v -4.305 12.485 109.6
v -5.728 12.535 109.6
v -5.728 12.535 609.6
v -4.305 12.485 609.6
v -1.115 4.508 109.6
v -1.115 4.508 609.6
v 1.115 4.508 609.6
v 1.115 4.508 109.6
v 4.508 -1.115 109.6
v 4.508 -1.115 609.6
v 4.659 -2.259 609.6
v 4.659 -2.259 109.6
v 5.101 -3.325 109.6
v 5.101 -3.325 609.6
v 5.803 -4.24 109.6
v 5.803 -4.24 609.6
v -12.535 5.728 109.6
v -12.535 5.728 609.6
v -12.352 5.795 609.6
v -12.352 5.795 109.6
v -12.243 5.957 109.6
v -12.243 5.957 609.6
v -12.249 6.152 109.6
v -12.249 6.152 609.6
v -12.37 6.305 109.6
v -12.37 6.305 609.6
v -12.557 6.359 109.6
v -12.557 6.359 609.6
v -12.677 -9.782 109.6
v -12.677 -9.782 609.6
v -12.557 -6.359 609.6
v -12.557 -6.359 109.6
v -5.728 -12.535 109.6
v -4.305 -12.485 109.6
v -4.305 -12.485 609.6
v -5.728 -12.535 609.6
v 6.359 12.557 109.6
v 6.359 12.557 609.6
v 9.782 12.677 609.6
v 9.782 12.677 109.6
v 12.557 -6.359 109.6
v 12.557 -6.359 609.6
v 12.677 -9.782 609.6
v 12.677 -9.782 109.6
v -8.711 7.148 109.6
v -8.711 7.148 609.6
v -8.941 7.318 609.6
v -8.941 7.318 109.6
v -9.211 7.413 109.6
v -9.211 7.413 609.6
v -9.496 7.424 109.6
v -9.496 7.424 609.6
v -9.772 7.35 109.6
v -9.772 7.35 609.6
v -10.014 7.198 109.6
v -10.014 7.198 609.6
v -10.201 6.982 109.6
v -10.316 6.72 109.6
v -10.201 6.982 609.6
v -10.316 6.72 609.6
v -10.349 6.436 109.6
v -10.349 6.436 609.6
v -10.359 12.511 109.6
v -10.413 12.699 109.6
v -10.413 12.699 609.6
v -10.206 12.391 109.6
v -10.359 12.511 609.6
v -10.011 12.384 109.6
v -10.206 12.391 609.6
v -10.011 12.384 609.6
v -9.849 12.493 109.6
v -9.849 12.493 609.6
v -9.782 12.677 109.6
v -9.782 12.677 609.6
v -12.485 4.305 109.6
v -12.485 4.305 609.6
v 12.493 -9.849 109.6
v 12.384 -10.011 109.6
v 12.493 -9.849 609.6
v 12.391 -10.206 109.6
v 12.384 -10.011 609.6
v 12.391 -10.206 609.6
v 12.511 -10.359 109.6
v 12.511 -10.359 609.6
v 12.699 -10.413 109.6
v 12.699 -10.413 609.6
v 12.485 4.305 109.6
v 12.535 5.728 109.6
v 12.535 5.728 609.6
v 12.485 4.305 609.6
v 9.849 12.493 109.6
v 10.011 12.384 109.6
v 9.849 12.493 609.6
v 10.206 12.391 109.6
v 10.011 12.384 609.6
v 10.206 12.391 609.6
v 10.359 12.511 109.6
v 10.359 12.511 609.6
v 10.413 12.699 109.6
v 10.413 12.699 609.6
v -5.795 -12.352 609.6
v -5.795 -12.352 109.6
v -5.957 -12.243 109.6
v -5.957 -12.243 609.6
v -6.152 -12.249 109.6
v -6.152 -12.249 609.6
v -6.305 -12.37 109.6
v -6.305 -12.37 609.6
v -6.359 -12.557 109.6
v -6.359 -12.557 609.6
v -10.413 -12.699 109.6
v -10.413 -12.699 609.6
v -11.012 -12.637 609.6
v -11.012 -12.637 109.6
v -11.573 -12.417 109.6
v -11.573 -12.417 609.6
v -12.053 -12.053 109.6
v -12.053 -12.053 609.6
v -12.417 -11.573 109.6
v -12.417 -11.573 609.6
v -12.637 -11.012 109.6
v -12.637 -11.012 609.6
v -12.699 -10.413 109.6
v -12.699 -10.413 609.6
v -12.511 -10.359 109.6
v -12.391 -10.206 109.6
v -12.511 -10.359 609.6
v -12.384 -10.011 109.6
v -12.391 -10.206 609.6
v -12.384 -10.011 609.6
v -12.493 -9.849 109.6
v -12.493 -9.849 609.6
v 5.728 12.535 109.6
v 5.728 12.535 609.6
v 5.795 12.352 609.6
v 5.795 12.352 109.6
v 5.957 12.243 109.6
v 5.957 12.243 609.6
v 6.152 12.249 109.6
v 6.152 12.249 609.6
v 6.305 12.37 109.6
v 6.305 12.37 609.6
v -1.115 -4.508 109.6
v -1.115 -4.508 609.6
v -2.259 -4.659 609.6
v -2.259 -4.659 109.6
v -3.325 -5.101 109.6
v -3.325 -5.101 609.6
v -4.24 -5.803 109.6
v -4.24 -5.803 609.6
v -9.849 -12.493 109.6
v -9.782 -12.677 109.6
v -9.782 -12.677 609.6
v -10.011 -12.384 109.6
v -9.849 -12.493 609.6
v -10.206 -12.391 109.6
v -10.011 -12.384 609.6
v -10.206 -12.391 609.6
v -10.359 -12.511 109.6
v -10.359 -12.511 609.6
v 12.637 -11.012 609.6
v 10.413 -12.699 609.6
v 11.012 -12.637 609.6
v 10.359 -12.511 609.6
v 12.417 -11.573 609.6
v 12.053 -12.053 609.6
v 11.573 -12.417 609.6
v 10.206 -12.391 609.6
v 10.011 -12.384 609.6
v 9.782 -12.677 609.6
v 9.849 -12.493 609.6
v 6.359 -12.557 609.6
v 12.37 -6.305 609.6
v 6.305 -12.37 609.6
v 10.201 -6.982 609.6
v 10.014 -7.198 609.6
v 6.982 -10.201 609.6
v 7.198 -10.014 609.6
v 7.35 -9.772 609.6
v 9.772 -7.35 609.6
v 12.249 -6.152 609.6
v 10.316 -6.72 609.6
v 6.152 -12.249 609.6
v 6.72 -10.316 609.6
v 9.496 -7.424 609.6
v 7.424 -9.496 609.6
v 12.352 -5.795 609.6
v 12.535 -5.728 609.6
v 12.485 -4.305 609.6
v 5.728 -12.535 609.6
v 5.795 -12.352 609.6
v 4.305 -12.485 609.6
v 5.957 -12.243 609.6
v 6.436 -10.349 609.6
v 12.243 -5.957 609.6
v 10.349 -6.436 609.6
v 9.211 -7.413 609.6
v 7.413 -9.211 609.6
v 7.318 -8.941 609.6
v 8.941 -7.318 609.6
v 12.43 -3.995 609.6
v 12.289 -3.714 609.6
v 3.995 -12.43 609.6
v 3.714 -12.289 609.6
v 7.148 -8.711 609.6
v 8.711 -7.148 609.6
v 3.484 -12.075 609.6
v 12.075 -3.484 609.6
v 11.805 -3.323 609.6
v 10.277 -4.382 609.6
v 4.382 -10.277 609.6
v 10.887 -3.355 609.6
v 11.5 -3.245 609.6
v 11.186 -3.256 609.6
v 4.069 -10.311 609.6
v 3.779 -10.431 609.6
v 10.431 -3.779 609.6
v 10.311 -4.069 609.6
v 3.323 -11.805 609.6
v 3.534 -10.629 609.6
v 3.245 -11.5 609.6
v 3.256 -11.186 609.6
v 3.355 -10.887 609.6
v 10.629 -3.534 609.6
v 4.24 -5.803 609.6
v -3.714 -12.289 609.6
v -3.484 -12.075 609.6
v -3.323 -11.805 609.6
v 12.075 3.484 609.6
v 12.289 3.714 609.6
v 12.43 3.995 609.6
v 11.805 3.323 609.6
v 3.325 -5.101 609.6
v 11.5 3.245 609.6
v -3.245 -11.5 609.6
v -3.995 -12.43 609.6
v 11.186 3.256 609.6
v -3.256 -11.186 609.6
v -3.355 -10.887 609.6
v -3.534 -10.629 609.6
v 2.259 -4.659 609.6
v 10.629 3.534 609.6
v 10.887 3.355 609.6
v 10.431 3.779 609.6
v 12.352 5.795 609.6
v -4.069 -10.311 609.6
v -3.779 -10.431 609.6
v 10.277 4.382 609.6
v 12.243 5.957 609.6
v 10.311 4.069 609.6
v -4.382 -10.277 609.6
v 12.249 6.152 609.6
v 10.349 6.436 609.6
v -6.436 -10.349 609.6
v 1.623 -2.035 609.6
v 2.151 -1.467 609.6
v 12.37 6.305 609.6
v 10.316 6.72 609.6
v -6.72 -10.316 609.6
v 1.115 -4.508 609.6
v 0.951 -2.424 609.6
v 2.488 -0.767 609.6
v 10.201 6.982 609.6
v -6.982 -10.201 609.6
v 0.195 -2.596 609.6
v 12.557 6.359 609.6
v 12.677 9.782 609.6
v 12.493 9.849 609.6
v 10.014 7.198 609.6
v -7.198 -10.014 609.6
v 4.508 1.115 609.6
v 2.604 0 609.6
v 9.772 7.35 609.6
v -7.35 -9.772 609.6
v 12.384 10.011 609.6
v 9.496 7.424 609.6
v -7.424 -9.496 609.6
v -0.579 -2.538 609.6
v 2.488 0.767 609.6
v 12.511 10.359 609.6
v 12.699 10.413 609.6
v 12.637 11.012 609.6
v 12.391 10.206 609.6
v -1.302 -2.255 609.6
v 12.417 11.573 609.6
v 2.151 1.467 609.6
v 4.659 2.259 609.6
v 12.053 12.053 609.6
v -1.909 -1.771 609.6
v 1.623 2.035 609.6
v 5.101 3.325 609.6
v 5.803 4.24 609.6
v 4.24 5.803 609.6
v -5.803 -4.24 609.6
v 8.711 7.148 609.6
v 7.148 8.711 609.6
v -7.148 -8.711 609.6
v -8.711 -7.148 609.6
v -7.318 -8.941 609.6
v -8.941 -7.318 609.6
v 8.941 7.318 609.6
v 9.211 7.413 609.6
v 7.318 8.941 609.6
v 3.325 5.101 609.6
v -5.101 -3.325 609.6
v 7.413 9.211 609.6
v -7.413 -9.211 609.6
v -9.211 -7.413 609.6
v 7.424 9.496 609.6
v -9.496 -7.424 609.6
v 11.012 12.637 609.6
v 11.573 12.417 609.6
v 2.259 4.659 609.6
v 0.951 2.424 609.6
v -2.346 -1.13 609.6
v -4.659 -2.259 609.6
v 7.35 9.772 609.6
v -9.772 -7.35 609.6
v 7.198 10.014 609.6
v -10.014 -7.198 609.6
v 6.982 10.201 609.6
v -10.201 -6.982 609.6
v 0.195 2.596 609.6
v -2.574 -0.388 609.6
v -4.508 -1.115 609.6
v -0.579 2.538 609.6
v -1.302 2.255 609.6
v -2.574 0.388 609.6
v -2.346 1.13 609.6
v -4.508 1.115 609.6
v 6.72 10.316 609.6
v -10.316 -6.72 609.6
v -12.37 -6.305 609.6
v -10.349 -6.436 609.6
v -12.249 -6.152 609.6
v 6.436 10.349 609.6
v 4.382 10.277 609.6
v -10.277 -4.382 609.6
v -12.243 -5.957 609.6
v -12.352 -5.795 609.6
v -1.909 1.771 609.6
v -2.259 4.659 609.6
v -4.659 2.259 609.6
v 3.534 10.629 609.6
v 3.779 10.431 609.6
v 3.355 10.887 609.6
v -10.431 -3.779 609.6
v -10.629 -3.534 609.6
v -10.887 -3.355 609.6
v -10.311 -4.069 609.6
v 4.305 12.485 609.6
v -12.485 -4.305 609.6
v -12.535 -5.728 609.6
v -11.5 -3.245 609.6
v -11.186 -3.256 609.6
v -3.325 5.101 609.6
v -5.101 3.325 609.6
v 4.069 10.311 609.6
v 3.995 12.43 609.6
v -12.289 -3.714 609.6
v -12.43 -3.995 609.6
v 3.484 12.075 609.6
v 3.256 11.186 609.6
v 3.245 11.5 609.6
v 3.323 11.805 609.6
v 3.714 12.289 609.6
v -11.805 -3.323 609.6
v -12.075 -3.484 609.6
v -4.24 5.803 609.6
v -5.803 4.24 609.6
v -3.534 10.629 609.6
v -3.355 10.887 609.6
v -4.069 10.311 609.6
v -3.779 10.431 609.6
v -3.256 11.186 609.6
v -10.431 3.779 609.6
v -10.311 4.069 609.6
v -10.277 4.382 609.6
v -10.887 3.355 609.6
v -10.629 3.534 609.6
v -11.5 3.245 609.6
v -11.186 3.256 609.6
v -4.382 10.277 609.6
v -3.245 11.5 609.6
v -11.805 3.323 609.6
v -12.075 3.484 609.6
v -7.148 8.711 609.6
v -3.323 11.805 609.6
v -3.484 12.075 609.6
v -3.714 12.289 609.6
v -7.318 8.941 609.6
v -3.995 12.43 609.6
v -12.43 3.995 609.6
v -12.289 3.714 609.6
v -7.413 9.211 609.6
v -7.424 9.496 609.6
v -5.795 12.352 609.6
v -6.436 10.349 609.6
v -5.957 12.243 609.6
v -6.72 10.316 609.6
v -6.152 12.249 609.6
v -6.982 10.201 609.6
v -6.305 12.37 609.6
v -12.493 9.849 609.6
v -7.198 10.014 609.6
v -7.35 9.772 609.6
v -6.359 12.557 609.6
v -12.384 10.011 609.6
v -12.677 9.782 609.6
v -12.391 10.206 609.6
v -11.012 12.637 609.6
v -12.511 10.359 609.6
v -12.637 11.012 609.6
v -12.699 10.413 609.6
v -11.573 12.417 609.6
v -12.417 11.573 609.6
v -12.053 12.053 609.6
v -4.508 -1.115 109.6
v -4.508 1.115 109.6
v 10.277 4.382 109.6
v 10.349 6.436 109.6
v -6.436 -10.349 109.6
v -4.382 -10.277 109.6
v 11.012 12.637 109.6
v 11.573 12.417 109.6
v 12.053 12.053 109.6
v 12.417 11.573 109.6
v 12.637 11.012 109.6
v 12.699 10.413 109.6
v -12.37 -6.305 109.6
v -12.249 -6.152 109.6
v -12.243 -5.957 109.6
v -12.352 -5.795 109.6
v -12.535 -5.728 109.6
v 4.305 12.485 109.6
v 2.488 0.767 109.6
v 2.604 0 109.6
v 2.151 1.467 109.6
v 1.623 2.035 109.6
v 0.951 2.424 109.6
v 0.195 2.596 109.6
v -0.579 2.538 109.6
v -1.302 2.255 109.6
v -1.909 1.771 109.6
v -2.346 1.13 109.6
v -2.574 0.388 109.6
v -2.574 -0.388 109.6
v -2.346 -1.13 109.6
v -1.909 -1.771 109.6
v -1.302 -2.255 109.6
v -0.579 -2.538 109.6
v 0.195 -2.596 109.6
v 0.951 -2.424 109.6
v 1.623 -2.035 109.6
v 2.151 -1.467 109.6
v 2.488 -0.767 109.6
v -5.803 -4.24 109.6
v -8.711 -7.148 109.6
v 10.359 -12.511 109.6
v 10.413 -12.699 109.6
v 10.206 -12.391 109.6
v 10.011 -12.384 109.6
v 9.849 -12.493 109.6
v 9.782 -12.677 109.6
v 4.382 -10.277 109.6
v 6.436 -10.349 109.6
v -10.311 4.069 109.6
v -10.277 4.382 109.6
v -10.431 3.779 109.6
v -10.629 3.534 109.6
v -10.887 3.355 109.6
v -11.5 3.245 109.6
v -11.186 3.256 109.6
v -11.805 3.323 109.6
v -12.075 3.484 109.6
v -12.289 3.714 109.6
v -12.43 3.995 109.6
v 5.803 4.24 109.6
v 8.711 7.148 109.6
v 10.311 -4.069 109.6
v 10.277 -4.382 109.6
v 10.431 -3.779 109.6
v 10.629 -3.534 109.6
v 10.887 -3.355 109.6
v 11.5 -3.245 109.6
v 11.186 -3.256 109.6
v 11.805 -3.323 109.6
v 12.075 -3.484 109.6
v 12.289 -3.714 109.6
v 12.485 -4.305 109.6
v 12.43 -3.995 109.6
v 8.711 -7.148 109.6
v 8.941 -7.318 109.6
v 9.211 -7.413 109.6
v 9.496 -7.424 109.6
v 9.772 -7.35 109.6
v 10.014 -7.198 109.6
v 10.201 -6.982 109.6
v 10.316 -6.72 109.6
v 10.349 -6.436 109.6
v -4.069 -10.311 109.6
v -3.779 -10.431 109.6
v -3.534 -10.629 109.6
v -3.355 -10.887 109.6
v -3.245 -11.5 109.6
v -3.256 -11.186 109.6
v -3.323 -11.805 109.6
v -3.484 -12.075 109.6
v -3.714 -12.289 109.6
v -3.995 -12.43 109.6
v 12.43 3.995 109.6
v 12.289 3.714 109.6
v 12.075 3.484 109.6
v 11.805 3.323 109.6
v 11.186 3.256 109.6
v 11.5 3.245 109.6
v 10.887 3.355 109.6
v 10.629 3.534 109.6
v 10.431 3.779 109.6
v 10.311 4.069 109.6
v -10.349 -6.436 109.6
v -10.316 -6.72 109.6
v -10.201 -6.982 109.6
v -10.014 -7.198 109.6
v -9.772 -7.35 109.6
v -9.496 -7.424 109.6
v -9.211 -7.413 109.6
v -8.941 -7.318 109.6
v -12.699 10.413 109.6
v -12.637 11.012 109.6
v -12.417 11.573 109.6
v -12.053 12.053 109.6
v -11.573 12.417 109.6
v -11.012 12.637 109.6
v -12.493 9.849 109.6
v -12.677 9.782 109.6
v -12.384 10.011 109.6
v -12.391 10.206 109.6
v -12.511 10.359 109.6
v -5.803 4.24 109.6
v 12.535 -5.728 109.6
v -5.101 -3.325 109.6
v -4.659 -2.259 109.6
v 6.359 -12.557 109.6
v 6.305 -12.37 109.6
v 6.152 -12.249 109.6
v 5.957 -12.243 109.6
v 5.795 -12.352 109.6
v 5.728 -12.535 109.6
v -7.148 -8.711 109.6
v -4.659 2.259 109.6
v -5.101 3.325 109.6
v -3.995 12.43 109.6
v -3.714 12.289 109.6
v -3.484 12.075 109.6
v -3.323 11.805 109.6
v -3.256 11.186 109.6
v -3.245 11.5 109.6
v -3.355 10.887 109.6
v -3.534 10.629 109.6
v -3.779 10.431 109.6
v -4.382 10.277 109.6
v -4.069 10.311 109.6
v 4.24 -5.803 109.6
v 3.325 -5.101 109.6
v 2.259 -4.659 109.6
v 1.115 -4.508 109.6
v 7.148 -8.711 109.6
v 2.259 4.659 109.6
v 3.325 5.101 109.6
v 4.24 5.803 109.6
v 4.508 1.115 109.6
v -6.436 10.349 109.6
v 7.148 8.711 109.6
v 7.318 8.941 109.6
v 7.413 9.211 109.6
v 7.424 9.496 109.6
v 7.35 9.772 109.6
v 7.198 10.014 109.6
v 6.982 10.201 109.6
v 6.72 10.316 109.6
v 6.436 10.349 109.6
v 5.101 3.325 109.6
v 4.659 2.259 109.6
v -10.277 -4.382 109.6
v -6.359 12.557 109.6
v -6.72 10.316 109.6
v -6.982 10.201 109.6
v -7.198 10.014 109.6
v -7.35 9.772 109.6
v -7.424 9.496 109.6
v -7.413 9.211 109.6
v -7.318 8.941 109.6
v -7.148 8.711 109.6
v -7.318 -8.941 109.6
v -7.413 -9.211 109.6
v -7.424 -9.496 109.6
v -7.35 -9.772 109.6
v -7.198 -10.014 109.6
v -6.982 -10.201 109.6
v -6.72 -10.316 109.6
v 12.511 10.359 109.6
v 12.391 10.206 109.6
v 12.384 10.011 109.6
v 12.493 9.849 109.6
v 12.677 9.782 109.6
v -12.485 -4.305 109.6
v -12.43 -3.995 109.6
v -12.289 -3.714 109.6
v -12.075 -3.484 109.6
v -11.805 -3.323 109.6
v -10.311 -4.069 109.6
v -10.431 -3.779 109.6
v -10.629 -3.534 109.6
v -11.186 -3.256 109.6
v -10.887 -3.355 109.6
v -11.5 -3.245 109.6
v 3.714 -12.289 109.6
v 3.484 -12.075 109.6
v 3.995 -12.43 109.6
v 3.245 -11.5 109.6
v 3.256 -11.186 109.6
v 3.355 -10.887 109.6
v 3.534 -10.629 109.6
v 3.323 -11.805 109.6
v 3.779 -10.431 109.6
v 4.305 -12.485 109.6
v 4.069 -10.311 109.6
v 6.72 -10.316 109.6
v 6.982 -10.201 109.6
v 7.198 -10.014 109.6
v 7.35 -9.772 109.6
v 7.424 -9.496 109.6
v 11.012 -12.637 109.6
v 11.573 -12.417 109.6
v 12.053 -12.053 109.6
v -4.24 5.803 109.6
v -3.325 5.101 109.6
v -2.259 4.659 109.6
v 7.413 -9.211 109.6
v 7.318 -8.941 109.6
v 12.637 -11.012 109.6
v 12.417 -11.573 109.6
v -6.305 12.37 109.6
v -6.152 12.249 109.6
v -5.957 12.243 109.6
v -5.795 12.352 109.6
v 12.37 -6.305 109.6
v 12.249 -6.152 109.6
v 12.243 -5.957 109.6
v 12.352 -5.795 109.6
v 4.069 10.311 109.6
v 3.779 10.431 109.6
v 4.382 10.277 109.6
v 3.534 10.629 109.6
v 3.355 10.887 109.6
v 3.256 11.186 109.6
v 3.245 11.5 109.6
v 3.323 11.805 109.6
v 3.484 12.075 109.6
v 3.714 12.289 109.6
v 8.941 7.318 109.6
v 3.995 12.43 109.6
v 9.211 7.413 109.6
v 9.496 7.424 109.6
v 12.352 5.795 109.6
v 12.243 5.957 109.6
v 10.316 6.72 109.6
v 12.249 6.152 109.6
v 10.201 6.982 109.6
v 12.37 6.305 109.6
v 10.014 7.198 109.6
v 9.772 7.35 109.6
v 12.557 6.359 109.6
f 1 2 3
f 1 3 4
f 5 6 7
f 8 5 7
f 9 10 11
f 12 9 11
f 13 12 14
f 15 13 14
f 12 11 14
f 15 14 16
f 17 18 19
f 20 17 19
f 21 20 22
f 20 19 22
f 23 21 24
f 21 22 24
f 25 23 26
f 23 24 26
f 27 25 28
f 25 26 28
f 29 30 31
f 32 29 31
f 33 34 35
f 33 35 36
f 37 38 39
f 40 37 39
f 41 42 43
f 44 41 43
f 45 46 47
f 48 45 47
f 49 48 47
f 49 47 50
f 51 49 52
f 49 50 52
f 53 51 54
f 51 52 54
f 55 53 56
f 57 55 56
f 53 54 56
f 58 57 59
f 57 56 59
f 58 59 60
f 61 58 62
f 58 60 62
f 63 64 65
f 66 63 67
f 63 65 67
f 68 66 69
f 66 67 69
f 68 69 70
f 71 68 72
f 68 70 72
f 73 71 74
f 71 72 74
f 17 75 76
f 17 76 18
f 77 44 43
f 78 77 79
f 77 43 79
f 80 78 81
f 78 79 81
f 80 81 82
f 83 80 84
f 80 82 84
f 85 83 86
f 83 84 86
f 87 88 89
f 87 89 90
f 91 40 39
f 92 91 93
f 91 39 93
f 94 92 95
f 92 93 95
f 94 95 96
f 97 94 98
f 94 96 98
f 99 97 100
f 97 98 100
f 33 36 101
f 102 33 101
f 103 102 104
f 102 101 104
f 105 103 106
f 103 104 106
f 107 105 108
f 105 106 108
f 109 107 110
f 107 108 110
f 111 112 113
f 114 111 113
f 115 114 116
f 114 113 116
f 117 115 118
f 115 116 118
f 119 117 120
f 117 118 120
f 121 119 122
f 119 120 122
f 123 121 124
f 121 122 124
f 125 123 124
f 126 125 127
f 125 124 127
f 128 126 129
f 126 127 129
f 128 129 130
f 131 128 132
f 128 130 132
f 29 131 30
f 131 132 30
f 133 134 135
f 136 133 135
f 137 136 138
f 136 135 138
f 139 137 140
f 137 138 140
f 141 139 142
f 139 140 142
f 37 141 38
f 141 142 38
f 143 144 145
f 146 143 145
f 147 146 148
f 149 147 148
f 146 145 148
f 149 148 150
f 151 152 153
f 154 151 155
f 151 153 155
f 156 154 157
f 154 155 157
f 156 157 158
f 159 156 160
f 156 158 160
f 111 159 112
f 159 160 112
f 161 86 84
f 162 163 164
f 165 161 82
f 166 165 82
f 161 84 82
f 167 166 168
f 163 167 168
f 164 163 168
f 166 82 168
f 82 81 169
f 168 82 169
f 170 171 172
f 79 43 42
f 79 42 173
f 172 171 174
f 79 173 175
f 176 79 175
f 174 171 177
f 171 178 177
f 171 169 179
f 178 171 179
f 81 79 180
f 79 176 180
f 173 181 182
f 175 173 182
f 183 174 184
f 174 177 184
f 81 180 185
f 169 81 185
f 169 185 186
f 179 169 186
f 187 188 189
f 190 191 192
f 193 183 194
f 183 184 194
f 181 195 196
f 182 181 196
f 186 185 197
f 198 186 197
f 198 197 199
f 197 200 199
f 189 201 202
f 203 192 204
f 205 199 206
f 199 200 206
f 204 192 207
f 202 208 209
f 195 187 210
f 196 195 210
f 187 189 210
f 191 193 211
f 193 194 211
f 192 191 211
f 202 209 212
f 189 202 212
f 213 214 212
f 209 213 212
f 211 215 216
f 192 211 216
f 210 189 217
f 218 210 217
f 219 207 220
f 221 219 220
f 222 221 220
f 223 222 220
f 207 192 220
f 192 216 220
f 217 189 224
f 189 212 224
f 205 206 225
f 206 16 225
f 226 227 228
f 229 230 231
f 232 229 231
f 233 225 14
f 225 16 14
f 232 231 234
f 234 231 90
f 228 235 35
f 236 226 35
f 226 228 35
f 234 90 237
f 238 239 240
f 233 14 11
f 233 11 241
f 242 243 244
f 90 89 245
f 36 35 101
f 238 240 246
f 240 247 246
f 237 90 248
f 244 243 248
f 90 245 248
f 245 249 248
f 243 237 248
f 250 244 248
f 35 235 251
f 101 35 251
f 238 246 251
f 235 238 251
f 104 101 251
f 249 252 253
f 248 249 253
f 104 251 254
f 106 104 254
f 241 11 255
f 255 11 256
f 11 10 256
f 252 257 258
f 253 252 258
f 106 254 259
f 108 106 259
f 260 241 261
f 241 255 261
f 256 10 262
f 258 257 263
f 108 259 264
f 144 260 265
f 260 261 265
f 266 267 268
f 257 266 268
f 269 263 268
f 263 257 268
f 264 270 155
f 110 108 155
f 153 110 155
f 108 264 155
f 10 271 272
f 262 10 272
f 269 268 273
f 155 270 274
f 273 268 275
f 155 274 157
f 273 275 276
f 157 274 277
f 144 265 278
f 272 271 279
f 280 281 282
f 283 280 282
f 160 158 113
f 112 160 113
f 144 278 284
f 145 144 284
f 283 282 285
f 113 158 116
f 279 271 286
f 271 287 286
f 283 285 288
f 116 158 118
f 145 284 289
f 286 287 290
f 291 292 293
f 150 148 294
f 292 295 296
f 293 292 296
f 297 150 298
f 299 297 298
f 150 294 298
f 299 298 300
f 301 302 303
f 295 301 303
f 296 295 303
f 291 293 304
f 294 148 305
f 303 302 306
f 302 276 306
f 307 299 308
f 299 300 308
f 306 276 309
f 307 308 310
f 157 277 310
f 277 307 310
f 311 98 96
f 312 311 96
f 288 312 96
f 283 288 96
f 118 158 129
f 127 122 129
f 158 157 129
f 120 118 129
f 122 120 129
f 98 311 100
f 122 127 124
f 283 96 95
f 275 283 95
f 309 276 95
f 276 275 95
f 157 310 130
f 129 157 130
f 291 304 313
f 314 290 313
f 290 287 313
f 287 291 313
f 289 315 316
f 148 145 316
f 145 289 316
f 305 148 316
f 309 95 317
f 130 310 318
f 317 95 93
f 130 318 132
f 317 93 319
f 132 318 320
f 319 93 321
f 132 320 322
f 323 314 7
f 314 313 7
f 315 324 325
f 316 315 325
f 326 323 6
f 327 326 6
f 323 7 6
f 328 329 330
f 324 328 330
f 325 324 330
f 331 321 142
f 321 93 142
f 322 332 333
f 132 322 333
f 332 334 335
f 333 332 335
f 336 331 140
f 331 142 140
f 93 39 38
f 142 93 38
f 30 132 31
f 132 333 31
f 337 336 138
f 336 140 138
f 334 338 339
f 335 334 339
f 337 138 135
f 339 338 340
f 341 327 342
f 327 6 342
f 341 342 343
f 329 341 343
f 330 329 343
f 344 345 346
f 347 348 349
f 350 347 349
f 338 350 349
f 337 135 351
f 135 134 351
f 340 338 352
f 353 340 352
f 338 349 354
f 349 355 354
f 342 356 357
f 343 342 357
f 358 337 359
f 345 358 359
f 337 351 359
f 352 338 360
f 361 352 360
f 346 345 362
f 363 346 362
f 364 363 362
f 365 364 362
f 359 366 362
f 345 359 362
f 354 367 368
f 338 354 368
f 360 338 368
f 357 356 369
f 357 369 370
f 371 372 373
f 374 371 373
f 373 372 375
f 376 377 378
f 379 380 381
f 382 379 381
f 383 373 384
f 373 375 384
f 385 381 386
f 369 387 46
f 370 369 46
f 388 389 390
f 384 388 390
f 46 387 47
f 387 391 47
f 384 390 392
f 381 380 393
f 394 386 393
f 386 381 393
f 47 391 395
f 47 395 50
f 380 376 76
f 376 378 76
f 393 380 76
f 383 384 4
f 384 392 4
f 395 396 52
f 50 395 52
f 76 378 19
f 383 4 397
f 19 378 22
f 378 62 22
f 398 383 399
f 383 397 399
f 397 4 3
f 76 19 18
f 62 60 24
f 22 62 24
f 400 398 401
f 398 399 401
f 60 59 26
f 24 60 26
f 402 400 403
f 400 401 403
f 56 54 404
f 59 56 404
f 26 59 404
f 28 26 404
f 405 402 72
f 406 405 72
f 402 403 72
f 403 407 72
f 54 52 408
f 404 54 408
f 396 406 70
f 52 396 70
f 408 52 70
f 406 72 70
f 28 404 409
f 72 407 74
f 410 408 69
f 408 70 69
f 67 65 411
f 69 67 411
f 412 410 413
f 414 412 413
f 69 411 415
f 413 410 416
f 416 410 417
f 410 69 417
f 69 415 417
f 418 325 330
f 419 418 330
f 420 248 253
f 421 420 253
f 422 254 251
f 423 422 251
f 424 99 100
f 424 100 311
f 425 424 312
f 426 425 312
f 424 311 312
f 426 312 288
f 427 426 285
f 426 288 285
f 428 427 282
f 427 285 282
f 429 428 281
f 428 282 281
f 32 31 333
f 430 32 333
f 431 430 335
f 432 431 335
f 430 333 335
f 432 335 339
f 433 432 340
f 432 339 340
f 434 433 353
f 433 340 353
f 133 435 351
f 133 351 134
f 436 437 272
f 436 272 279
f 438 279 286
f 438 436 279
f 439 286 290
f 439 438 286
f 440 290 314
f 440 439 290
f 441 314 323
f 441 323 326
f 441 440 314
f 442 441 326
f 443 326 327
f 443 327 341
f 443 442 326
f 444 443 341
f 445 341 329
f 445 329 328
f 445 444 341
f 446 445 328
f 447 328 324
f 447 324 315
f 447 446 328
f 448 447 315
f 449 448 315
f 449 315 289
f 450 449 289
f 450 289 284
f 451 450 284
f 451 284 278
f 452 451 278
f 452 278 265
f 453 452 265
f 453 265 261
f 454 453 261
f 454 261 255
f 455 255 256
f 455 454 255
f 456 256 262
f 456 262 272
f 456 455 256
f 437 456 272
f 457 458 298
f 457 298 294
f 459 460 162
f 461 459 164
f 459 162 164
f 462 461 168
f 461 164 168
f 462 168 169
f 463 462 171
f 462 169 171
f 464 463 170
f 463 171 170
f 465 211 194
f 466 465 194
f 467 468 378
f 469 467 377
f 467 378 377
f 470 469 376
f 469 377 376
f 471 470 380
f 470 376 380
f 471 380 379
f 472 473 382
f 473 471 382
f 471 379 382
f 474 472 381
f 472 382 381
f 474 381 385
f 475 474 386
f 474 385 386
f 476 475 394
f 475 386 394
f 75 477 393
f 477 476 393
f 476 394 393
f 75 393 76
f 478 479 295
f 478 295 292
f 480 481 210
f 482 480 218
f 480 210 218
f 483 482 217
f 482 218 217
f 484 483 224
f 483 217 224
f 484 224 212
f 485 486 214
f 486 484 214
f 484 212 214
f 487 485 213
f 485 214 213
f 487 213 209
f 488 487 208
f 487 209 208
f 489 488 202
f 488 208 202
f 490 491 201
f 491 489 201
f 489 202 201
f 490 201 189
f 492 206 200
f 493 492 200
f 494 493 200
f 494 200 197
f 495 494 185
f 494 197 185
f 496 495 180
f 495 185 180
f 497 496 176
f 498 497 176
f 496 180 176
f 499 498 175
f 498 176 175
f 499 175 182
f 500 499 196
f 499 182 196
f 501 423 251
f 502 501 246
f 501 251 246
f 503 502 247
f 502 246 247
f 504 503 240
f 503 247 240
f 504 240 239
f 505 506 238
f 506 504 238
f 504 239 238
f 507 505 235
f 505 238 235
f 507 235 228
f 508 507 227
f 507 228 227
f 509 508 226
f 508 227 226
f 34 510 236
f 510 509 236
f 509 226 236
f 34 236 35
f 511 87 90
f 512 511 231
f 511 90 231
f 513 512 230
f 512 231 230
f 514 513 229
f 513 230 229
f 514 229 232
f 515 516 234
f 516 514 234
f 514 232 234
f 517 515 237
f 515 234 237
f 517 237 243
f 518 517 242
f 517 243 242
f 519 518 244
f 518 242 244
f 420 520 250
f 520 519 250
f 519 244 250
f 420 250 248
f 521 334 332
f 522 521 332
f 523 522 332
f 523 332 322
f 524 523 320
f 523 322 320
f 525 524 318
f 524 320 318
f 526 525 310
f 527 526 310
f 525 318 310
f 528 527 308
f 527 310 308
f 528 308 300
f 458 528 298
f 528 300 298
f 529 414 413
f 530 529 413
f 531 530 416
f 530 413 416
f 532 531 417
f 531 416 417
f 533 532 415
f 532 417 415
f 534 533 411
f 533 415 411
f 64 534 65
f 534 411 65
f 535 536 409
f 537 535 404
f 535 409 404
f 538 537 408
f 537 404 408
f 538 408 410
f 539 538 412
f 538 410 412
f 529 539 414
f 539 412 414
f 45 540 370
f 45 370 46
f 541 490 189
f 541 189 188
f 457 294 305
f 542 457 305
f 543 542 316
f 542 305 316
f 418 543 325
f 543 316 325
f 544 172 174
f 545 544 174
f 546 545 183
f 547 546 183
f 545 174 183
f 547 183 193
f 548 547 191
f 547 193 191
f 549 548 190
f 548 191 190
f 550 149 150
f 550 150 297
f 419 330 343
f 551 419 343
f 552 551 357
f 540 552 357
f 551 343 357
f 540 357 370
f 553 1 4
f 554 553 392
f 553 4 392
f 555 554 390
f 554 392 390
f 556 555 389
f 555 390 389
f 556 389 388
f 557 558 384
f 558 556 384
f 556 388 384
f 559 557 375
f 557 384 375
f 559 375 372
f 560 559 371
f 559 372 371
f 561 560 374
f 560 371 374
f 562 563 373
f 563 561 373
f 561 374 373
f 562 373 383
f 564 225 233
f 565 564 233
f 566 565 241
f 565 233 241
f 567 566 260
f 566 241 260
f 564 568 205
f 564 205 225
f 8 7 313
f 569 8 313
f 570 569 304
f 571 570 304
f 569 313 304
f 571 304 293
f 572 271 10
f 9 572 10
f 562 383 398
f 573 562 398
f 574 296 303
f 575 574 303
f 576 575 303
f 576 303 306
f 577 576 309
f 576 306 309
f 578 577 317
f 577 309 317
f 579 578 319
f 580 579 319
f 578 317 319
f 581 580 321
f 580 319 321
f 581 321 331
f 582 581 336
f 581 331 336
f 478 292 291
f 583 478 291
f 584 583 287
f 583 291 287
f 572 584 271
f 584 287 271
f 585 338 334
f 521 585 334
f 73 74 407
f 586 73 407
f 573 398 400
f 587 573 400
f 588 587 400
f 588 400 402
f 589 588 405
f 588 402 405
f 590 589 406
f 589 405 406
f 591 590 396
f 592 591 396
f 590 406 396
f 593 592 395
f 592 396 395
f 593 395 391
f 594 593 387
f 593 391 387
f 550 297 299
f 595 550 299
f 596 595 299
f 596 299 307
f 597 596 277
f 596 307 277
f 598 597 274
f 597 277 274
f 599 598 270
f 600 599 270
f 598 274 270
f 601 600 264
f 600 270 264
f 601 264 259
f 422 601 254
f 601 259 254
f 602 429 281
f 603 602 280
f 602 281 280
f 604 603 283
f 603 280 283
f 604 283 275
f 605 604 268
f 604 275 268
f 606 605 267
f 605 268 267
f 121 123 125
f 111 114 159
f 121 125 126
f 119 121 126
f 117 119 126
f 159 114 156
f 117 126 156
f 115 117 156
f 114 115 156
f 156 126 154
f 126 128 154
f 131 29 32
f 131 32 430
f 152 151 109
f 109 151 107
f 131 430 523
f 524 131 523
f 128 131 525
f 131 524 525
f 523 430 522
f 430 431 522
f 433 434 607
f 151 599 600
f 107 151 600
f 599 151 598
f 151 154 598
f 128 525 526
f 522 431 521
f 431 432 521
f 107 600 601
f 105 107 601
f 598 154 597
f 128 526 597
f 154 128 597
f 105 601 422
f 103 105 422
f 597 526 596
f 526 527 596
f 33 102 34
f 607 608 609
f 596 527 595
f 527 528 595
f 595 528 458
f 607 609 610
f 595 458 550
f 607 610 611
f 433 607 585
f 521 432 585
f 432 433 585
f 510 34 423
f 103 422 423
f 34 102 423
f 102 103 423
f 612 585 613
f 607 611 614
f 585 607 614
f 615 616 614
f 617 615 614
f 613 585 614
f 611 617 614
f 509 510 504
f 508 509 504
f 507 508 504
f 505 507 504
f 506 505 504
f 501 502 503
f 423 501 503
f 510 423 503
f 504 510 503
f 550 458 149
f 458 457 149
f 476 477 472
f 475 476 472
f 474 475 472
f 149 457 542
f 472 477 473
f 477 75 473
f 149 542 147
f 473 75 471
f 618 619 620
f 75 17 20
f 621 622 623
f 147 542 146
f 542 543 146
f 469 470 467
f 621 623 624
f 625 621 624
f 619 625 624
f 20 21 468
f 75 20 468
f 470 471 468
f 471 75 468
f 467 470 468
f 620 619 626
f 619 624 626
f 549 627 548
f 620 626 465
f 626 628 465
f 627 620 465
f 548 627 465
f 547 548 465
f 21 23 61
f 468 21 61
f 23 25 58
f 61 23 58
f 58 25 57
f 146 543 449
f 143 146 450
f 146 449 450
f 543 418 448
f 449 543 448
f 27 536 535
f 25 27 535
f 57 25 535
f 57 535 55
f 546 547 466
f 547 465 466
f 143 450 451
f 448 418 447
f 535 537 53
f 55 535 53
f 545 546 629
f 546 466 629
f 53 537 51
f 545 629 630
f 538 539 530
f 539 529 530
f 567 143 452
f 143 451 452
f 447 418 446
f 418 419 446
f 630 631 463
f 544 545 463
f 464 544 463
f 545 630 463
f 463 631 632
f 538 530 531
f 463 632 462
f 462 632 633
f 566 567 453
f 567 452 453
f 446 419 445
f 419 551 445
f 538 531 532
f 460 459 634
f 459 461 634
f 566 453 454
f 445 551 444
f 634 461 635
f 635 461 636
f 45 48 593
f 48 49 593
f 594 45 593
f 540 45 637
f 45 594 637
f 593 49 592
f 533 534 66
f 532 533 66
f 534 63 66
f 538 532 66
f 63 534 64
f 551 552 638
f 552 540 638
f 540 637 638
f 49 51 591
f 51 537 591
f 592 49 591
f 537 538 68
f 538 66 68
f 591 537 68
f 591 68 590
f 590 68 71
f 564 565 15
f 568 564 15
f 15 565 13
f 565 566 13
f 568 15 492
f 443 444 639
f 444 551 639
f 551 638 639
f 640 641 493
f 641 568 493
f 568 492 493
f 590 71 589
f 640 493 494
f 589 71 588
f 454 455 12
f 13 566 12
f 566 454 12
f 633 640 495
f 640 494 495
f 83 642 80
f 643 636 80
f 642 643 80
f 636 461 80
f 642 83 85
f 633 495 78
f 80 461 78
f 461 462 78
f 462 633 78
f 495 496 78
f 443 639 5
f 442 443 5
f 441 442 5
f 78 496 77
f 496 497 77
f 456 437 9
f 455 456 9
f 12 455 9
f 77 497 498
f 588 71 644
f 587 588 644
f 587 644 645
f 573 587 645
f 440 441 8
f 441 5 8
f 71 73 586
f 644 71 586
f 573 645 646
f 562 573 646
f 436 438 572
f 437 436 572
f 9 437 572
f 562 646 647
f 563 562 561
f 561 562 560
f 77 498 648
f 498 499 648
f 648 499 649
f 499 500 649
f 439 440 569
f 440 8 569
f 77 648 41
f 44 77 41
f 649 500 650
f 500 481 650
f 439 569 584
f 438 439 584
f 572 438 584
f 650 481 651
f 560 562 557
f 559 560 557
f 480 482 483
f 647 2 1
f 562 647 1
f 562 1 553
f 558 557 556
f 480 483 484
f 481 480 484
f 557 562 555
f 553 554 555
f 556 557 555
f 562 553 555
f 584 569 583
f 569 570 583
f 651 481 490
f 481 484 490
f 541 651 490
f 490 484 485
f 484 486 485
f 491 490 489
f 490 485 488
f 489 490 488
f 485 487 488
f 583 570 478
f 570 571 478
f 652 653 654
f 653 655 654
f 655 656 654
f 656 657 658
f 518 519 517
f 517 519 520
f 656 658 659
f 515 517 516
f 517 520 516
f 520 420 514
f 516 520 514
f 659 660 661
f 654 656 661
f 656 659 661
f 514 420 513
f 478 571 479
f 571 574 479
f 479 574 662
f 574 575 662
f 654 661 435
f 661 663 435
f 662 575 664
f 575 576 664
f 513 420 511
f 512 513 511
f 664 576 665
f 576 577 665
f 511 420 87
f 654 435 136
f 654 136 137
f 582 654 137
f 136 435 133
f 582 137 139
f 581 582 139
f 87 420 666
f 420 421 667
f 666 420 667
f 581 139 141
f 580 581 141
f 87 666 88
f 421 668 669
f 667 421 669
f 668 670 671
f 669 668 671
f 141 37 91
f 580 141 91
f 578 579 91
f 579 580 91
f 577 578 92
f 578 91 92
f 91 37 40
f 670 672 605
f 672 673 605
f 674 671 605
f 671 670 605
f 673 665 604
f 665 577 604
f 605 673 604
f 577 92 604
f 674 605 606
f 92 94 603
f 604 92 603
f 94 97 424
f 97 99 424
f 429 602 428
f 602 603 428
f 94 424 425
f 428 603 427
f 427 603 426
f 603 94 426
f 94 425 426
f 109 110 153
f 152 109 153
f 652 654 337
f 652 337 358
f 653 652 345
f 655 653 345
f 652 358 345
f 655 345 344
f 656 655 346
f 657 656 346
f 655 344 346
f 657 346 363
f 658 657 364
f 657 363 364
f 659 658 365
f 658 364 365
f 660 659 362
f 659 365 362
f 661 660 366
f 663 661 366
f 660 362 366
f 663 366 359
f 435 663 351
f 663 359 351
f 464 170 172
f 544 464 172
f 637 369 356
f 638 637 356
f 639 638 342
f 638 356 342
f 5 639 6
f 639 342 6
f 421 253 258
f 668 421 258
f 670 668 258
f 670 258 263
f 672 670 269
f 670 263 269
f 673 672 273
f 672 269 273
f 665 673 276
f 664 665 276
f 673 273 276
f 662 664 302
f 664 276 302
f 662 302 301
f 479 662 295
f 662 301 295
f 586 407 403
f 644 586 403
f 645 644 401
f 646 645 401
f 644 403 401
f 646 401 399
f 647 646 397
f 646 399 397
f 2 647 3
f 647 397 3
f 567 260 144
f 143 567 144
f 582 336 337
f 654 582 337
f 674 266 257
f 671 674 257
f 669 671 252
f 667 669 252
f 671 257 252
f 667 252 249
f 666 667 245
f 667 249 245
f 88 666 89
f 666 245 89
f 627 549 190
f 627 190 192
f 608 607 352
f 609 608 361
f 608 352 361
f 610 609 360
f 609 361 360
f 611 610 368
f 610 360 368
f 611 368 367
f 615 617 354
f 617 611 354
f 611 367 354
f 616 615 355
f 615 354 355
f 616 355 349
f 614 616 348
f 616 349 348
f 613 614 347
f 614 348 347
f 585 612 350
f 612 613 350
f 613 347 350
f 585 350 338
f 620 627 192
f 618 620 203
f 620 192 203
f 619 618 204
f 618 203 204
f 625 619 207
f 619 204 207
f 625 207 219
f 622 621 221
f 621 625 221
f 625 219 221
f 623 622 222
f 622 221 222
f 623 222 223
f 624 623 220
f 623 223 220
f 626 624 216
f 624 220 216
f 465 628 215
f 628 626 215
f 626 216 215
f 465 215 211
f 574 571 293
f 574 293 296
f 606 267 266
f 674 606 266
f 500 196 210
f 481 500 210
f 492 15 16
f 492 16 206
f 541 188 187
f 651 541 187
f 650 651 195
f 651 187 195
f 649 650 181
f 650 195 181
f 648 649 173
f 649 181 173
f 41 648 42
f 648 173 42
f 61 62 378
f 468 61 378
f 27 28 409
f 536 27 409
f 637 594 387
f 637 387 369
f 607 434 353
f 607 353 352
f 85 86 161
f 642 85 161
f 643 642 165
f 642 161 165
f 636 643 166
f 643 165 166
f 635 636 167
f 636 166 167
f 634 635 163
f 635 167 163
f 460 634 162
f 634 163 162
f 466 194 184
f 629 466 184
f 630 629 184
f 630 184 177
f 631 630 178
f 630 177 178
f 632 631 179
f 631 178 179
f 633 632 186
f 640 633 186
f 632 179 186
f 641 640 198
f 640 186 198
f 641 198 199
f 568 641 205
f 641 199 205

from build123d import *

# Parameters (mm, degrees)
SKETCH3_R               = 2.6035
EXTRUDE1_DEPTH          = 609.6
SKETCH5_W               = 65.927676168
SKETCH5_H               = 719.2
CUT_EXTRUDE1_DEPTH      = 10
CUT_EXTRUDE1_DEPTH_BACK = 34


with BuildPart() as part:
    # Sketch3 → Extrude1 (new body, symmetric)
    with BuildSketch(Plane.XY):
        with BuildLine():
            Line((-1.115277175, 4.5085), (1.115277175, 4.5085))
            ThreePointArc((1.115277175, 4.5085), (2.806584872, 4.844922018), (4.240406305, 5.80297087))
            Line((4.240406305, 5.80297087), (7.148423664, 8.710988229))
            ThreePointArc((7.148423664, 8.710988229), (7.349906316, 9.772227925), (6.436353897, 10.348636575))
            Line((6.436353897, 10.348636575), (4.381960454, 10.276895575))
            ThreePointArc((4.381960454, 10.276895575), (3.239173075, 11.342562046), (4.304839546, 12.485349424))
            Line((4.304839546, 12.485349424), (5.728246175, 12.535055879))
            ThreePointArc((5.728246175, 12.535055879), (6.054756855, 12.230579745), (6.35923299, 12.557090424))
            Line((6.35923299, 12.557090424), (9.782092278, 12.676619304))
            ThreePointArc((9.782092278, 12.676619304), (10.108602958, 12.37214317), (10.413079092, 12.69865385))
            ThreePointArc((10.413079092, 12.69865385), (12.052764565, 12.052764565), (12.69865385, 10.413079092))
            ThreePointArc((12.69865385, 10.413079092), (12.37214317, 10.108602958), (12.676619304, 9.782092278))
            Line((12.676619304, 9.782092278), (12.557090424, 6.35923299))
            ThreePointArc((12.557090424, 6.35923299), (12.230579745, 6.054756855), (12.535055879, 5.728246175))
            Line((12.535055879, 5.728246175), (12.485349424, 4.304839546))
            ThreePointArc((12.485349424, 4.304839546), (11.342562046, 3.239173075), (10.276895575, 4.381960454))
            Line((10.276895575, 4.381960454), (10.348636575, 6.436353897))
            ThreePointArc((10.348636575, 6.436353897), (9.772227925, 7.349906316), (8.710988229, 7.148423664))
            Line((8.710988229, 7.148423664), (5.80297087, 4.240406305))
            ThreePointArc((5.80297087, 4.240406305), (4.844922018, 2.806584872), (4.5085, 1.115277175))
            Line((4.5085, 1.115277175), (4.5085, -1.115277175))
            ThreePointArc((4.5085, -1.115277175), (4.844922018, -2.806584872), (5.80297087, -4.240406305))
            Line((5.80297087, -4.240406305), (8.710988229, -7.148423664))
            ThreePointArc((8.710988229, -7.148423664), (9.772227925, -7.349906316), (10.348636575, -6.436353897))
            Line((10.348636575, -6.436353897), (10.276895575, -4.381960454))
            ThreePointArc((10.276895575, -4.381960454), (11.342562046, -3.239173075), (12.485349424, -4.304839546))
            Line((12.485349424, -4.304839546), (12.535055879, -5.728246175))
            ThreePointArc((12.535055879, -5.728246175), (12.230579745, -6.054756855), (12.557090424, -6.35923299))
            Line((12.557090424, -6.35923299), (12.676619304, -9.782092278))
            ThreePointArc((12.676619304, -9.782092278), (12.37214317, -10.108602958), (12.69865385, -10.413079092))
            ThreePointArc((12.69865385, -10.413079092), (12.052764565, -12.052764565), (10.413079092, -12.69865385))
            ThreePointArc((10.413079092, -12.69865385), (10.108602958, -12.37214317), (9.782092278, -12.676619304))
            Line((9.782092278, -12.676619304), (6.35923299, -12.557090424))
            ThreePointArc((6.35923299, -12.557090424), (6.054756855, -12.230579745), (5.728246175, -12.535055879))
            Line((5.728246175, -12.535055879), (4.304839546, -12.485349424))
            ThreePointArc((4.304839546, -12.485349424), (3.239173075, -11.342562046), (4.381960454, -10.276895575))
            Line((4.381960454, -10.276895575), (6.436353897, -10.348636575))
            ThreePointArc((6.436353897, -10.348636575), (7.349906316, -9.772227925), (7.148423664, -8.710988229))
            Line((7.148423664, -8.710988229), (4.240406305, -5.80297087))
            ThreePointArc((4.240406305, -5.80297087), (2.806584872, -4.844922018), (1.115277175, -4.5085))
            Line((1.115277175, -4.5085), (-1.115277175, -4.5085))
            ThreePointArc((-1.115277175, -4.5085), (-2.806584872, -4.844922018), (-4.240406305, -5.80297087))
            Line((-4.240406305, -5.80297087), (-7.148423664, -8.710988229))
            ThreePointArc((-7.148423664, -8.710988229), (-7.349906316, -9.772227925), (-6.436353897, -10.348636575))
            Line((-6.436353897, -10.348636575), (-4.381960454, -10.276895575))
            ThreePointArc((-4.381960454, -10.276895575), (-3.239173075, -11.342562046), (-4.304839546, -12.485349424))
            Line((-4.304839546, -12.485349424), (-5.728246175, -12.535055879))
            ThreePointArc((-5.728246175, -12.535055879), (-6.054756855, -12.230579745), (-6.35923299, -12.557090424))
            Line((-6.35923299, -12.557090424), (-9.782092278, -12.676619304))
            ThreePointArc((-9.782092278, -12.676619304), (-10.108602958, -12.37214317), (-10.413079092, -12.69865385))
            ThreePointArc((-10.413079092, -12.69865385), (-12.052764565, -12.052764565), (-12.69865385, -10.413079092))
            ThreePointArc((-12.69865385, -10.413079092), (-12.37214317, -10.108602958), (-12.676619304, -9.782092278))
            Line((-12.676619304, -9.782092278), (-12.557090424, -6.35923299))
            ThreePointArc((-12.557090424, -6.35923299), (-12.230579745, -6.054756855), (-12.535055879, -5.728246175))
            Line((-12.535055879, -5.728246175), (-12.485349424, -4.304839546))
            ThreePointArc((-12.485349424, -4.304839546), (-11.342562046, -3.239173075), (-10.276895575, -4.381960454))
            Line((-10.276895575, -4.381960454), (-10.348636575, -6.436353897))
            ThreePointArc((-10.348636575, -6.436353897), (-9.772227925, -7.349906316), (-8.710988229, -7.148423664))
            Line((-8.710988229, -7.148423664), (-5.80297087, -4.240406305))
            ThreePointArc((-5.80297087, -4.240406305), (-4.844922018, -2.806584872), (-4.5085, -1.115277175))
            Line((-4.5085, -1.115277175), (-4.5085, 1.115277175))
            ThreePointArc((-4.5085, 1.115277175), (-4.844922018, 2.806584872), (-5.80297087, 4.240406305))
            Line((-5.80297087, 4.240406305), (-8.710988229, 7.148423664))
            ThreePointArc((-8.710988229, 7.148423664), (-9.772227925, 7.349906316), (-10.348636575, 6.436353897))
            Line((-10.348636575, 6.436353897), (-10.276895575, 4.381960454))
            ThreePointArc((-10.276895575, 4.381960454), (-11.342562046, 3.239173075), (-12.485349424, 4.304839546))
            Line((-12.485349424, 4.304839546), (-12.535055879, 5.728246175))
            ThreePointArc((-12.535055879, 5.728246175), (-12.230579745, 6.054756855), (-12.557090424, 6.35923299))
            Line((-12.557090424, 6.35923299), (-12.676619304, 9.782092278))
            ThreePointArc((-12.676619304, 9.782092278), (-12.37214317, 10.108602958), (-12.69865385, 10.413079092))
            ThreePointArc((-12.69865385, 10.413079092), (-12.052764565, 12.052764565), (-10.413079092, 12.69865385))
            ThreePointArc((-10.413079092, 12.69865385), (-10.108602958, 12.37214317), (-9.782092278, 12.676619304))
            Line((-9.782092278, 12.676619304), (-6.35923299, 12.557090424))
            ThreePointArc((-6.35923299, 12.557090424), (-6.054756855, 12.230579745), (-5.728246175, 12.535055879))
            Line((-5.728246175, 12.535055879), (-4.304839546, 12.485349424))
            ThreePointArc((-4.304839546, 12.485349424), (-3.239173075, 11.342562046), (-4.381960454, 10.276895575))
            Line((-4.381960454, 10.276895575), (-6.436353897, 10.348636575))
            ThreePointArc((-6.436353897, 10.348636575), (-7.349906316, 9.772227925), (-7.148423664, 8.710988229))
            Line((-7.148423664, 8.710988229), (-4.240406305, 5.80297087))
            ThreePointArc((-4.240406305, 5.80297087), (-2.806584872, 4.844922018), (-1.115277175, 4.5085))
        make_face()
        Circle(SKETCH3_R, mode=Mode.SUBTRACT)
    extrude(amount=EXTRUDE1_DEPTH, both=True)

    # Sketch5 → Cut-Extrude1 (cut, two sides)
    with BuildSketch(Plane(origin=(0.430223788, 12.319997369, 0), x_dir=(0.999390827, -0.034899497, 0), z_dir=(0.034899497, 0.999390827, 0))) as cut_extrude1_sk:
        with Locations((-6.086750473, 250)):
            Rectangle(SKETCH5_W, SKETCH5_H)
    extrude(amount=CUT_EXTRUDE1_DEPTH, mode=Mode.SUBTRACT)
    extrude(cut_extrude1_sk.sketch, amount=-CUT_EXTRUDE1_DEPTH_BACK, mode=Mode.SUBTRACT)


solid = part.part
